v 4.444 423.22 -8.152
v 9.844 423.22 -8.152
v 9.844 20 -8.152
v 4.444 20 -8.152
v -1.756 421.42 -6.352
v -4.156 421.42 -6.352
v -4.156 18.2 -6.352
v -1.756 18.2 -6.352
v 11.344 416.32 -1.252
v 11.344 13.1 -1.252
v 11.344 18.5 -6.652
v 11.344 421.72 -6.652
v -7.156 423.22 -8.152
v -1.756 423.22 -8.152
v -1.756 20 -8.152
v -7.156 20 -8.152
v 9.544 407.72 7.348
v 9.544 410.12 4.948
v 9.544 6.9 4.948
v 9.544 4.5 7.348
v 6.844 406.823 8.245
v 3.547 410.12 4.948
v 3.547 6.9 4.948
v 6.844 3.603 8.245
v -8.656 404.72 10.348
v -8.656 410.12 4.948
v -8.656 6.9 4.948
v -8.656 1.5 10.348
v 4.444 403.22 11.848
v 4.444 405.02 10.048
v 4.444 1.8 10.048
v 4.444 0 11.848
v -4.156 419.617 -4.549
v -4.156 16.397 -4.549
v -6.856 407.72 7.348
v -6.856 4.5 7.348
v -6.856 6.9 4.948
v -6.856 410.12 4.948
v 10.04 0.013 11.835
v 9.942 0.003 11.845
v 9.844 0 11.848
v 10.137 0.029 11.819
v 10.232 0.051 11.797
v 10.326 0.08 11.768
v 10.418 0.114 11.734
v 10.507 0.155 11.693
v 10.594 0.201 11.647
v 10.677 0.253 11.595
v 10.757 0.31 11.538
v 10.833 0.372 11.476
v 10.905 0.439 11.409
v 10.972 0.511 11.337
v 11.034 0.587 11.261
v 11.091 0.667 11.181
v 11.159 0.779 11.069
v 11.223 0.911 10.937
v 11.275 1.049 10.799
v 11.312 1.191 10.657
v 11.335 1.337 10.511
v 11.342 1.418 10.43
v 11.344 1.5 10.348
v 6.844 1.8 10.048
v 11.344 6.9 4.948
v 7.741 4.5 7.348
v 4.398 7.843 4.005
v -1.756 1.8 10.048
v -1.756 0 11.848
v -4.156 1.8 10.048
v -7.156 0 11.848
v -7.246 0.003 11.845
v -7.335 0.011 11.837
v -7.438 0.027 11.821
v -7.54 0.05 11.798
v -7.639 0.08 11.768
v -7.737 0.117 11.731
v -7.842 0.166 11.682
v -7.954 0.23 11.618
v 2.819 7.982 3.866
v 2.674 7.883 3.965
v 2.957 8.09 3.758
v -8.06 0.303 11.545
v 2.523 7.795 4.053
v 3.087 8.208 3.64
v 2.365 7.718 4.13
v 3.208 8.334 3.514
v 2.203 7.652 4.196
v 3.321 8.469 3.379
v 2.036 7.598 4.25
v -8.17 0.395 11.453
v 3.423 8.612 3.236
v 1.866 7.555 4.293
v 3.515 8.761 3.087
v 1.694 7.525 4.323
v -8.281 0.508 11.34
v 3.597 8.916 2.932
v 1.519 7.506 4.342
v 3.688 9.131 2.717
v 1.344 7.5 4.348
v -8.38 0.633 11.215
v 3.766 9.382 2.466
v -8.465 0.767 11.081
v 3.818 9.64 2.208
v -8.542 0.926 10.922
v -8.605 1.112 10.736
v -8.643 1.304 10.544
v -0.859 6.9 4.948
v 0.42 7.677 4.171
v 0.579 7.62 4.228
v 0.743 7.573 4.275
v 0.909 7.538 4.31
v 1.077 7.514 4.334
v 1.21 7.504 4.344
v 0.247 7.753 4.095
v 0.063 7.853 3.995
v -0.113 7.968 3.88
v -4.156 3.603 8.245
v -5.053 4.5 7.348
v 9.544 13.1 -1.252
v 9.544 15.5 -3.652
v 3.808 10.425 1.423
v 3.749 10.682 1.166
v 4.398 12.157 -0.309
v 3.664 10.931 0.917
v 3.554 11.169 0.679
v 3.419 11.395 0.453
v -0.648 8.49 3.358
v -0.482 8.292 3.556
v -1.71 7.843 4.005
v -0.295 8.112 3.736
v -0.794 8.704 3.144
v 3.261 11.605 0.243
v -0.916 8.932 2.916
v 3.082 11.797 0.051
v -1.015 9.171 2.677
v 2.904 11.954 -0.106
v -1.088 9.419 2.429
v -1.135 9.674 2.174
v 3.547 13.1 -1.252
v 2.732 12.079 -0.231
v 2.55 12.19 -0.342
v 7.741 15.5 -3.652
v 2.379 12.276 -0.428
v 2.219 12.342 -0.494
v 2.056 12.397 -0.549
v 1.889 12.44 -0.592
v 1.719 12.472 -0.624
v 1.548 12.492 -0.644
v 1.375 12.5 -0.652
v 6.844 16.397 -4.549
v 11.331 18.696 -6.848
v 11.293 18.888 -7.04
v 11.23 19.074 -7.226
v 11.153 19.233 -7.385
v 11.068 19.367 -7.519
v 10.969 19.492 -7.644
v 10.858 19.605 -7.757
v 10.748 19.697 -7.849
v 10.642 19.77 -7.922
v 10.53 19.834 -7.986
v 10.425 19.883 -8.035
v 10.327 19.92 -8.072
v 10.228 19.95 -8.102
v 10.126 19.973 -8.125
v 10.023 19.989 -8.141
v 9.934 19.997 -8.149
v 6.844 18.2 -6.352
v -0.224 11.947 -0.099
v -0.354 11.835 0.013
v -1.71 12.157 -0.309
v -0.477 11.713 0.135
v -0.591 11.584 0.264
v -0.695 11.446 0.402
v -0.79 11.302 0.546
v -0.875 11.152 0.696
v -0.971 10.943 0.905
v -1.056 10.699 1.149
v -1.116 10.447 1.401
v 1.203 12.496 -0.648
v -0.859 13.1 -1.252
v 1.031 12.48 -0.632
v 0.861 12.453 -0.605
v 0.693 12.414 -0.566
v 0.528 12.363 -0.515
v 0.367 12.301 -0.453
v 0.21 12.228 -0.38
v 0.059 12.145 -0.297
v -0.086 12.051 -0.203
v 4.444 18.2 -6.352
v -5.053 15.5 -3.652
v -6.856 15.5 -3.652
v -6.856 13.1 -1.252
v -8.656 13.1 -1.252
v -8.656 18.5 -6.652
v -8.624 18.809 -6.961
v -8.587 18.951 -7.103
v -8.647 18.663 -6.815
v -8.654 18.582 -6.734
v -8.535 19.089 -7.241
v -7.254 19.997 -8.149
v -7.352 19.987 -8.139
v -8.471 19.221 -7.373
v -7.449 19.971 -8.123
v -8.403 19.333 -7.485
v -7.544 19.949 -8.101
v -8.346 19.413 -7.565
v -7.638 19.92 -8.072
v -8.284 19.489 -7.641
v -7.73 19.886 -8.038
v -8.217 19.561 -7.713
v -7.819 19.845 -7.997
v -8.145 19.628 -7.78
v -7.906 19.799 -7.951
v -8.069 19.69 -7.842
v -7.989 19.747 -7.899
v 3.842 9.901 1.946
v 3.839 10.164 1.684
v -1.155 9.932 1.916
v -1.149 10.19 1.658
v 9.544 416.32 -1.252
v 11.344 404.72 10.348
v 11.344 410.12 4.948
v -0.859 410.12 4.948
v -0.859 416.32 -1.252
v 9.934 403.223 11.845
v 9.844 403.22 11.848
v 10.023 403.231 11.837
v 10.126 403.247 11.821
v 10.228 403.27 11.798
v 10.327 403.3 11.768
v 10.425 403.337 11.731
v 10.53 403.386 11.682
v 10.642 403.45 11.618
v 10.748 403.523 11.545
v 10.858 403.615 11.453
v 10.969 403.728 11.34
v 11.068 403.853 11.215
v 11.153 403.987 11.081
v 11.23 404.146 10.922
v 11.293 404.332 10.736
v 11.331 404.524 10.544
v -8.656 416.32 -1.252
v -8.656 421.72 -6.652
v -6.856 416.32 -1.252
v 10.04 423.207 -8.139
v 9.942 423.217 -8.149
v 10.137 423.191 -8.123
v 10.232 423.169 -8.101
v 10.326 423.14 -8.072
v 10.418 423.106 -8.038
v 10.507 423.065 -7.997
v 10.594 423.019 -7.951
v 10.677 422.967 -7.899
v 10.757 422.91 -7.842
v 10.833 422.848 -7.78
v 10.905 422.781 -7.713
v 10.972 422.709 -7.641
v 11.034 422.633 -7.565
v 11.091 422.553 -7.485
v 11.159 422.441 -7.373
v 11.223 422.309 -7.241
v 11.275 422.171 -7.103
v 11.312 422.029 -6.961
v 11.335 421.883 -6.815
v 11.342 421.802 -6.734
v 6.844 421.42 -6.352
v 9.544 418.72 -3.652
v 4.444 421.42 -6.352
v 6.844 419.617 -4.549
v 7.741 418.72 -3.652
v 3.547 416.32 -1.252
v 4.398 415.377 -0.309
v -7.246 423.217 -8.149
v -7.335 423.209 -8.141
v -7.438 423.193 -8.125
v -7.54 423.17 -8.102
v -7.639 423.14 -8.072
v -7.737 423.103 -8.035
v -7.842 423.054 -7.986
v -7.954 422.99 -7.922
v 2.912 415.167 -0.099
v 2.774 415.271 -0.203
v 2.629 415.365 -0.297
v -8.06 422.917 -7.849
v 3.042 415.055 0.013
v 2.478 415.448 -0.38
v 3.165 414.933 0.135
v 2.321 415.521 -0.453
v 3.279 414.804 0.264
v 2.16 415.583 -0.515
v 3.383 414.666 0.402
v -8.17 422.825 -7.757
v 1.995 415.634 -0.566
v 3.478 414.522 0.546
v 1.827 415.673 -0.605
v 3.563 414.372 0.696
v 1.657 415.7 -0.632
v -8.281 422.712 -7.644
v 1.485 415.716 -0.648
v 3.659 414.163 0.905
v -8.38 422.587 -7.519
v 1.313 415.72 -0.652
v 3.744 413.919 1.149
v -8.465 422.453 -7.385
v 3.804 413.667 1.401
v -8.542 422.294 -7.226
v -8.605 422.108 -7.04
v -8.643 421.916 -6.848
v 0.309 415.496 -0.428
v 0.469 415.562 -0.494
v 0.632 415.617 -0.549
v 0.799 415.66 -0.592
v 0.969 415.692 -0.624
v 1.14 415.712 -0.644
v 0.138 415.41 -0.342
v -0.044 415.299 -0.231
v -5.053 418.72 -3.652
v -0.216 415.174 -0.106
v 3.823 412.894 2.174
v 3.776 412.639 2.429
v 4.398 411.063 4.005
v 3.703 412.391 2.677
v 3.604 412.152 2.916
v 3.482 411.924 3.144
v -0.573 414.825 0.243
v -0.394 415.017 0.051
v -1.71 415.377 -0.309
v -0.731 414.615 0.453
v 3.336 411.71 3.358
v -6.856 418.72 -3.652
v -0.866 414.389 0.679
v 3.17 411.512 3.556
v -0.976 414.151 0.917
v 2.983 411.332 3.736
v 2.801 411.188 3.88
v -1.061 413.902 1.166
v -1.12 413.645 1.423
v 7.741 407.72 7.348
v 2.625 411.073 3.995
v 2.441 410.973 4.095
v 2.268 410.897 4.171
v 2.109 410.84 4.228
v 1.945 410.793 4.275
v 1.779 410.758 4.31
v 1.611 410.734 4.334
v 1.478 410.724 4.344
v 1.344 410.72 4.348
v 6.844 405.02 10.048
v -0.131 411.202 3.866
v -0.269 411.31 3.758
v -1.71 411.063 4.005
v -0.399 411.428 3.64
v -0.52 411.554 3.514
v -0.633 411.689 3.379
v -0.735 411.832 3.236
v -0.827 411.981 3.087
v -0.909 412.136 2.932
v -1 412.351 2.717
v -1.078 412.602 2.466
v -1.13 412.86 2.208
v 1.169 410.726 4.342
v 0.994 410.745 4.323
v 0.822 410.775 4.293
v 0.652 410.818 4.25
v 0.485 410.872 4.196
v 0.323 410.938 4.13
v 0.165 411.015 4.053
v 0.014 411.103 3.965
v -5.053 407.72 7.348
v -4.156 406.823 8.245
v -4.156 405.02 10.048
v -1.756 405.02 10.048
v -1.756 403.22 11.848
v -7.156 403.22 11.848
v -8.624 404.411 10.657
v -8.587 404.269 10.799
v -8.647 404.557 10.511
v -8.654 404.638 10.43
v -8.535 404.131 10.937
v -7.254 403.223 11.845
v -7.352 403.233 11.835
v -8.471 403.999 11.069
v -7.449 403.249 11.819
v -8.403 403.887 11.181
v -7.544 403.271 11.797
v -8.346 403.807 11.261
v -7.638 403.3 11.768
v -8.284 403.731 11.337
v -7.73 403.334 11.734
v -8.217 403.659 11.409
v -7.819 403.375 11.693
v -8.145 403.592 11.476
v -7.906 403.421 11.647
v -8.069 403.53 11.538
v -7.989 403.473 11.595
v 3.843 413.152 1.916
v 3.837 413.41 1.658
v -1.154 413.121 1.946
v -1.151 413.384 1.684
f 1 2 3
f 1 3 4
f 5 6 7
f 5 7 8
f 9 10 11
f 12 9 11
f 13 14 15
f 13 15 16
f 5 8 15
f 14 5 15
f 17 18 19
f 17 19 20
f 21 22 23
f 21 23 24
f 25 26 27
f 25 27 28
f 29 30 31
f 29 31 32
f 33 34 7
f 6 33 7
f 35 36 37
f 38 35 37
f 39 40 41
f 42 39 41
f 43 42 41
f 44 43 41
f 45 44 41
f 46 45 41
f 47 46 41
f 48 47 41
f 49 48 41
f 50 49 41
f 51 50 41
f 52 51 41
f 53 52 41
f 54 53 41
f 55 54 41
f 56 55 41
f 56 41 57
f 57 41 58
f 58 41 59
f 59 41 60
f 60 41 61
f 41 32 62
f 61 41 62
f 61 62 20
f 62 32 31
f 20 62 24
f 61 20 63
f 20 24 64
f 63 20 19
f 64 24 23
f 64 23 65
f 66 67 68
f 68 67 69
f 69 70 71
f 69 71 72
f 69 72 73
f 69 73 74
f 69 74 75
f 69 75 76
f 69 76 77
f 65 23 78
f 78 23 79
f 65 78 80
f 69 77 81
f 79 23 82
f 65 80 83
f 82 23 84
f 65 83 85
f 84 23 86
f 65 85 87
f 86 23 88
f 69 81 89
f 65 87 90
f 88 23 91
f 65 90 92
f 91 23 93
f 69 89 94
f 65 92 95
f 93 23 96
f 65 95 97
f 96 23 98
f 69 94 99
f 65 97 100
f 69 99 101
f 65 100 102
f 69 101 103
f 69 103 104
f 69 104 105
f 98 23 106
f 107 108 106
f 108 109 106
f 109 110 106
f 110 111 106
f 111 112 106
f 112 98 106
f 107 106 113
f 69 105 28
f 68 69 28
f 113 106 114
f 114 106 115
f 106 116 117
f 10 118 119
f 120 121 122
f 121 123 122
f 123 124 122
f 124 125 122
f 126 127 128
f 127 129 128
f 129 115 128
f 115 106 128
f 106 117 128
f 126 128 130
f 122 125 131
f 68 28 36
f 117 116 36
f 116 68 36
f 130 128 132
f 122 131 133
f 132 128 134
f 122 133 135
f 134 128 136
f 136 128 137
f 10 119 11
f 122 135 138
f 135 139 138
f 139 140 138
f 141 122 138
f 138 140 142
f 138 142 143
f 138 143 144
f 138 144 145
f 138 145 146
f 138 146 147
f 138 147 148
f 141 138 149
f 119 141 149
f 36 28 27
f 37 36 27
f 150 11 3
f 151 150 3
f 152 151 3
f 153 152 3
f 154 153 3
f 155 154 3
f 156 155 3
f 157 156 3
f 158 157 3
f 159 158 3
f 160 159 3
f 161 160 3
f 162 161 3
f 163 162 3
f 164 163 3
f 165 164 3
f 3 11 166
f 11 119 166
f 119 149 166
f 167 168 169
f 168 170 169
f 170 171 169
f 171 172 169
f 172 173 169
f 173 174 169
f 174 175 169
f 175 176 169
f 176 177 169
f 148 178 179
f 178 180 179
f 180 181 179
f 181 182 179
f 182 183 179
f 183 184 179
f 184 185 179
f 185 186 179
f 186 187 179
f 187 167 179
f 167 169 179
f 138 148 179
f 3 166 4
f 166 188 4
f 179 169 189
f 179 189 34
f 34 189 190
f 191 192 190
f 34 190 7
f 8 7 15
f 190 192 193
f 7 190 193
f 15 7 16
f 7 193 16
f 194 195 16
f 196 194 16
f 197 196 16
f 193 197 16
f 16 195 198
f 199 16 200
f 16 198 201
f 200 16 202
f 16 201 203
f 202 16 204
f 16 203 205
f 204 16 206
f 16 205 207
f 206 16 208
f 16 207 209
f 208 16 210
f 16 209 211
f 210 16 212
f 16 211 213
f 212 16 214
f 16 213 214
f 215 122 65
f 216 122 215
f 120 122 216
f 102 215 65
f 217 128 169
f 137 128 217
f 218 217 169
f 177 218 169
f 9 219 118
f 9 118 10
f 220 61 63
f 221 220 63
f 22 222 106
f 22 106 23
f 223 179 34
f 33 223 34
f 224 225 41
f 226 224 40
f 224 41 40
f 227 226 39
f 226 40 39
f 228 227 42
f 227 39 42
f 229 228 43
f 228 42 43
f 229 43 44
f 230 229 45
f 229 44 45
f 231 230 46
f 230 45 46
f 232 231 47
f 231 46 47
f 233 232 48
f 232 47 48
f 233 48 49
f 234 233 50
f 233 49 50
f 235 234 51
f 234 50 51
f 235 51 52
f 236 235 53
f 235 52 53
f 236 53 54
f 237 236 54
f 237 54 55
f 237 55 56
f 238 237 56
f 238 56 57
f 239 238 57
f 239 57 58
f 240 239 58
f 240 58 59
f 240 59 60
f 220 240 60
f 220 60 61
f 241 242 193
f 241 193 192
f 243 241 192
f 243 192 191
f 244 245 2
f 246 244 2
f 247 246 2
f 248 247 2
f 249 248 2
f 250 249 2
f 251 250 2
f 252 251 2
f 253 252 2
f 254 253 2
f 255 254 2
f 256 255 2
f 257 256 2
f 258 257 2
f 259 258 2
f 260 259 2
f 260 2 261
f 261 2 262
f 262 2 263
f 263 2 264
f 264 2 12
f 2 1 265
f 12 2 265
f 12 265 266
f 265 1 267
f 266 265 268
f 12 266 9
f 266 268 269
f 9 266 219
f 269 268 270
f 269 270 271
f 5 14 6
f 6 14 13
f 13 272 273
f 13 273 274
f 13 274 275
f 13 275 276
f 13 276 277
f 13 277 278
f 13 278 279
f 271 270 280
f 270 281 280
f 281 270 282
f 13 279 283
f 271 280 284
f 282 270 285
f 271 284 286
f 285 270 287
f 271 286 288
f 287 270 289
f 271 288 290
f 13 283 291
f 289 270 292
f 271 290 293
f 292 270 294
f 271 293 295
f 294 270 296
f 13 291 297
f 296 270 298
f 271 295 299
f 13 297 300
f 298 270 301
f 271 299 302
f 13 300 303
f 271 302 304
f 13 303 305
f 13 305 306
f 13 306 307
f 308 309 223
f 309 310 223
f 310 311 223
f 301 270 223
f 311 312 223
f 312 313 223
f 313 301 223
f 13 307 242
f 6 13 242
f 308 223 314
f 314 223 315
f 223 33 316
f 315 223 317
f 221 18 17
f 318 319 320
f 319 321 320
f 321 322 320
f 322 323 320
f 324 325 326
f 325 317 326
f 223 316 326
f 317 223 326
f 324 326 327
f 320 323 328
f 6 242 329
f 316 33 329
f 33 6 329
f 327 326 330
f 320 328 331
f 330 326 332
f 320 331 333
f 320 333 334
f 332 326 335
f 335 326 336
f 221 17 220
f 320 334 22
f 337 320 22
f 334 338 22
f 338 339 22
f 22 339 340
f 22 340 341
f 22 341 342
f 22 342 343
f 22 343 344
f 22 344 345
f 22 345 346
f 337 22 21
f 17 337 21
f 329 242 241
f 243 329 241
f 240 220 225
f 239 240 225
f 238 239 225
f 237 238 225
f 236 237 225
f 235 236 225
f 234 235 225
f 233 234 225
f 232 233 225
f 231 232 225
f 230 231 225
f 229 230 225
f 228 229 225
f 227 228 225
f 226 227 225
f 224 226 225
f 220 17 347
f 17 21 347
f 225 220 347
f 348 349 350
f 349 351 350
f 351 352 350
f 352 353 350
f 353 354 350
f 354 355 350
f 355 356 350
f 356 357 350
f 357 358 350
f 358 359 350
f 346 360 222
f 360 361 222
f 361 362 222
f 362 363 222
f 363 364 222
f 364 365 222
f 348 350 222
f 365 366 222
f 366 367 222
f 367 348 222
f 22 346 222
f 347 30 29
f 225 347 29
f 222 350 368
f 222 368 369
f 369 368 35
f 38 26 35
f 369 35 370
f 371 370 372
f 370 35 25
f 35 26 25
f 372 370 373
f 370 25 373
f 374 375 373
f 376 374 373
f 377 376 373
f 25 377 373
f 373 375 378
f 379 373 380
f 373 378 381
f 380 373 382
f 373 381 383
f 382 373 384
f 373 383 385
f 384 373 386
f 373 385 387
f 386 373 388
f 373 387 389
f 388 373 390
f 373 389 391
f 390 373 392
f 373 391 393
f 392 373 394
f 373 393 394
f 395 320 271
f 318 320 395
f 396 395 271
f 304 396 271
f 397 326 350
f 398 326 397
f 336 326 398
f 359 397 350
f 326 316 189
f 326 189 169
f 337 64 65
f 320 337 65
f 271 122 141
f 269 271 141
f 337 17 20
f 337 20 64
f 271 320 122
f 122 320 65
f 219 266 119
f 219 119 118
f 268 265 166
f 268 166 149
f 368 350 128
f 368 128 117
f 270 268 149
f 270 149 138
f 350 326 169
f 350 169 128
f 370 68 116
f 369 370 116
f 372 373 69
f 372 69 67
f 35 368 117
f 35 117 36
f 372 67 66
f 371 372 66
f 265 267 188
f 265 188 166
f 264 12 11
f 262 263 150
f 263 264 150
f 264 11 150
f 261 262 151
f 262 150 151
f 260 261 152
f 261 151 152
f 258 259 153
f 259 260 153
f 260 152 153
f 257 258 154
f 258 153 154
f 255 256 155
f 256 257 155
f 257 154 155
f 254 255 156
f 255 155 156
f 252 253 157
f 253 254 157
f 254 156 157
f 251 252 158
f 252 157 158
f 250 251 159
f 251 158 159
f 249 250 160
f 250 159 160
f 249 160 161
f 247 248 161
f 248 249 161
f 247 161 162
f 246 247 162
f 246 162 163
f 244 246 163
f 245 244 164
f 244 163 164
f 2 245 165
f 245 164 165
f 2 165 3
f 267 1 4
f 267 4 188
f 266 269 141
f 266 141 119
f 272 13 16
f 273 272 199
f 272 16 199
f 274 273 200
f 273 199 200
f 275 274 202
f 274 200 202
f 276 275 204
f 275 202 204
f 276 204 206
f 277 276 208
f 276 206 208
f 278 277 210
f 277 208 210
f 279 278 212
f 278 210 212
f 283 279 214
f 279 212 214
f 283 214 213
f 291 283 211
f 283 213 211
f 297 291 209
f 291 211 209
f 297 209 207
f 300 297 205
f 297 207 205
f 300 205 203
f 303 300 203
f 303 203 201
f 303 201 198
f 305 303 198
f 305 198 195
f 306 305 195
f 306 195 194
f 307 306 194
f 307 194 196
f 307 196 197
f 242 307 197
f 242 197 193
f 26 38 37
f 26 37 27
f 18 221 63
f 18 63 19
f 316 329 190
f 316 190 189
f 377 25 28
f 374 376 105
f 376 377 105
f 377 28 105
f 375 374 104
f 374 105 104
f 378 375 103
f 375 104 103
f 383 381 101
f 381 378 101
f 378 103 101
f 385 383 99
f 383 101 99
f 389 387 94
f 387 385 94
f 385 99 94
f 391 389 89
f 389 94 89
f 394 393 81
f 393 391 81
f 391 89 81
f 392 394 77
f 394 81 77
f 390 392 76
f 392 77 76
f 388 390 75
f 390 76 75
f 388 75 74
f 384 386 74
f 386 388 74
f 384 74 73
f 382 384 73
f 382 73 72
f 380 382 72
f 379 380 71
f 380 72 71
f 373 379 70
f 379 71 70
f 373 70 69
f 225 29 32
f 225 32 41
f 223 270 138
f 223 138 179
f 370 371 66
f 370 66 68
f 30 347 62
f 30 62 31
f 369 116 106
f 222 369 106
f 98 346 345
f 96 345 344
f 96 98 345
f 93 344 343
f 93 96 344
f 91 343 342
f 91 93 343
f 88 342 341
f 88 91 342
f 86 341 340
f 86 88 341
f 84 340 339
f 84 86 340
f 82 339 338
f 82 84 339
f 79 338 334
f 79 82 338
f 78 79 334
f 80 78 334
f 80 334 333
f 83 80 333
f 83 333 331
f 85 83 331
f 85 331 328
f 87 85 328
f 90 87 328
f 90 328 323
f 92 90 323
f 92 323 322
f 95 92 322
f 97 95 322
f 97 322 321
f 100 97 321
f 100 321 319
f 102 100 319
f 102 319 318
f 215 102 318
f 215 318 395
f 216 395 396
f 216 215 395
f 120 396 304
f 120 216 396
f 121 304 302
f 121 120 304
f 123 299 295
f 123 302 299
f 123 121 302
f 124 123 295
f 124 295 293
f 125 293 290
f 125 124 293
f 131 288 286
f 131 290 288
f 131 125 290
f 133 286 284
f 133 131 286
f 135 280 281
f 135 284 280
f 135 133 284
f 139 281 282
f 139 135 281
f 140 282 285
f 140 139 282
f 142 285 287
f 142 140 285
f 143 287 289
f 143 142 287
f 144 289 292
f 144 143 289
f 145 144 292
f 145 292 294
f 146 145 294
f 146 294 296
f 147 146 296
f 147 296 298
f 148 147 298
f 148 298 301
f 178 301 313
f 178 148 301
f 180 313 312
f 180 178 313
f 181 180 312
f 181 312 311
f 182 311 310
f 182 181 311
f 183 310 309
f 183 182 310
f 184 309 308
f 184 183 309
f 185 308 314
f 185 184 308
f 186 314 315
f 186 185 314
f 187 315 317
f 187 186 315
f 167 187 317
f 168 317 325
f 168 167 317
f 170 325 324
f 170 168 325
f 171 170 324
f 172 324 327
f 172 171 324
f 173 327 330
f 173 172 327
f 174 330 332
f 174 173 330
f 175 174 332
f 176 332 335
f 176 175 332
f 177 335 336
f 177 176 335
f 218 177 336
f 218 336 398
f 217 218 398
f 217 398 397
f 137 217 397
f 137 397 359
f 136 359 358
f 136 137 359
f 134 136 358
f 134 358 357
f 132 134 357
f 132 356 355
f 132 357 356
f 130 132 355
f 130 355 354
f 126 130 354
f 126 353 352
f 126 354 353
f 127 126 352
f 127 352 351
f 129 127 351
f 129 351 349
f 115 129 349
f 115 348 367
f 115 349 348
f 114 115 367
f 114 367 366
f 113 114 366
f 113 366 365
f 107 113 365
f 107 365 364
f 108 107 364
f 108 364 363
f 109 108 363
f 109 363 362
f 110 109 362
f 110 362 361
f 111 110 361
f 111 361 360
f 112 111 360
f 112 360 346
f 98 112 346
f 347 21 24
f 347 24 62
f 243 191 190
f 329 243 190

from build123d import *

# Parameters (mm, degrees)
SKETCH_1_R          = 2.5
EXTRUDE_1_DEPTH     = 423.22
CUT_EXTRUDE_2_DEPTH = 424.857928392


with BuildPart() as part:
    # 草图1 → 凸台-拉伸1 (new body)
    with BuildSketch(Plane(origin=(0, 0, 0), x_dir=(1, 0, 0), z_dir=(0, 1, 0))):
        with BuildLine():
            Line((-6.856001319, -4.947998187), (-8.656001319, -4.947998187))
            Line((-8.656001319, -4.947998187), (-8.656001319, -10.347998187))
            ThreePointArc((-8.656001319, -10.347998187), (-8.216661491, -11.408658358), (-7.156001319, -11.847998187))
            Line((-7.156001319, -11.847998187), (-1.756001319, -11.847998187))
            Line((-1.756001319, -11.847998187), (-1.756001319, -10.047998187))
            Line((-1.756001319, -10.047998187), (-4.156001319, -10.047998187))
            Line((-4.156001319, -10.047998187), (-4.156001319, -8.245048342))
            Line((-4.156001319, -8.245048342), (-0.858951164, -4.947998187))
            Line((-0.858951164, -4.947998187), (3.546948526, -4.947998187))
            Line((3.546948526, -4.947998187), (6.843998681, -8.245048342))
            Line((6.843998681, -8.245048342), (6.843998681, -10.047998187))
            Line((6.843998681, -10.047998187), (4.443998681, -10.047998187))
            Line((4.443998681, -10.047998187), (4.443998681, -11.847998187))
            Line((4.443998681, -11.847998187), (9.843998681, -11.847998187))
            ThreePointArc((9.843998681, -11.847998187), (10.904658853, -11.408658358), (11.343998681, -10.347998187))
            Line((11.343998681, -10.347998187), (11.343998681, -4.947998187))
            Line((11.343998681, -4.947998187), (9.543998681, -4.947998187))
            Line((9.543998681, -4.947998187), (9.543998681, -7.347998187))
            Line((9.543998681, -7.347998187), (7.741048836, -7.347998187))
            Line((7.741048836, -7.347998187), (4.398125701, -4.005075052))
            Line((4.398125701, -4.005075052), (4.398125701, 0.309078679))
            Line((4.398125701, 0.309078679), (7.741048836, 3.652001813))
            Line((7.741048836, 3.652001813), (9.543998681, 3.652001813))
            Line((9.543998681, 3.652001813), (9.543998681, 1.252001813))
            Line((9.543998681, 1.252001813), (11.343998681, 1.252001813))
            Line((11.343998681, 1.252001813), (11.343998681, 6.652001813))
            ThreePointArc((11.343998681, 6.652001813), (10.904658853, 7.712661985), (9.843998681, 8.152001813))
            Line((9.843998681, 8.152001813), (4.443998681, 8.152001813))
            Line((4.443998681, 8.152001813), (4.443998681, 6.352001813))
            Line((4.443998681, 6.352001813), (6.843998681, 6.352001813))
            Line((6.843998681, 6.352001813), (6.843998681, 4.549051969))
            Line((6.843998681, 4.549051969), (3.546948526, 1.252001813))
            Line((3.546948526, 1.252001813), (-0.858951164, 1.252001813))
            Line((-0.858951164, 1.252001813), (-4.156001319, 4.549051969))
            Line((-4.156001319, 4.549051969), (-4.156001319, 6.352001813))
            Line((-4.156001319, 6.352001813), (-1.756001319, 6.352001813))
            Line((-1.756001319, 6.352001813), (-1.756001319, 8.152001813))
            Line((-1.756001319, 8.152001813), (-7.156001319, 8.152001813))
            ThreePointArc((-7.156001319, 8.152001813), (-8.216661491, 7.712661985), (-8.656001319, 6.652001813))
            Line((-8.656001319, 6.652001813), (-8.656001319, 1.252001813))
            Line((-8.656001319, 1.252001813), (-6.856001319, 1.252001813))
            Line((-6.856001319, 1.252001813), (-6.856001319, 3.652001813))
            Line((-6.856001319, 3.652001813), (-5.053051474, 3.652001813))
            Line((-5.053051474, 3.652001813), (-1.710128339, 0.309078679))
            Line((-1.710128339, 0.309078679), (-1.710128339, -4.005075052))
            Line((-1.710128339, -4.005075052), (-5.053051474, -7.347998187))
            Line((-5.053051474, -7.347998187), (-6.856001319, -7.347998187))
            Line((-6.856001319, -7.347998187), (-6.856001319, -4.947998187))
        make_face()
        with Locations(Location((1.343998681, -1.847998187, 0), (0, 0, 270))):
            Circle(SKETCH_1_R, mode=Mode.SUBTRACT)
    extrude(amount=EXTRUDE_1_DEPTH)

    # 草图3 → 切除-拉伸2 (cut, through all)
    with BuildSketch(Plane.ZY.offset(8.656001319)):
        Polygon((-8.152001813, 423.22), (11.847998187, 403.22), (11.847998187, 423.22), align=None)
        Polygon((11.847998187, 0), (-8.152001813, 20), (-8.152001813, 0), align=None)
    extrude(amount=-CUT_EXTRUDE_2_DEPTH, mode=Mode.SUBTRACT)


solid = part.part
